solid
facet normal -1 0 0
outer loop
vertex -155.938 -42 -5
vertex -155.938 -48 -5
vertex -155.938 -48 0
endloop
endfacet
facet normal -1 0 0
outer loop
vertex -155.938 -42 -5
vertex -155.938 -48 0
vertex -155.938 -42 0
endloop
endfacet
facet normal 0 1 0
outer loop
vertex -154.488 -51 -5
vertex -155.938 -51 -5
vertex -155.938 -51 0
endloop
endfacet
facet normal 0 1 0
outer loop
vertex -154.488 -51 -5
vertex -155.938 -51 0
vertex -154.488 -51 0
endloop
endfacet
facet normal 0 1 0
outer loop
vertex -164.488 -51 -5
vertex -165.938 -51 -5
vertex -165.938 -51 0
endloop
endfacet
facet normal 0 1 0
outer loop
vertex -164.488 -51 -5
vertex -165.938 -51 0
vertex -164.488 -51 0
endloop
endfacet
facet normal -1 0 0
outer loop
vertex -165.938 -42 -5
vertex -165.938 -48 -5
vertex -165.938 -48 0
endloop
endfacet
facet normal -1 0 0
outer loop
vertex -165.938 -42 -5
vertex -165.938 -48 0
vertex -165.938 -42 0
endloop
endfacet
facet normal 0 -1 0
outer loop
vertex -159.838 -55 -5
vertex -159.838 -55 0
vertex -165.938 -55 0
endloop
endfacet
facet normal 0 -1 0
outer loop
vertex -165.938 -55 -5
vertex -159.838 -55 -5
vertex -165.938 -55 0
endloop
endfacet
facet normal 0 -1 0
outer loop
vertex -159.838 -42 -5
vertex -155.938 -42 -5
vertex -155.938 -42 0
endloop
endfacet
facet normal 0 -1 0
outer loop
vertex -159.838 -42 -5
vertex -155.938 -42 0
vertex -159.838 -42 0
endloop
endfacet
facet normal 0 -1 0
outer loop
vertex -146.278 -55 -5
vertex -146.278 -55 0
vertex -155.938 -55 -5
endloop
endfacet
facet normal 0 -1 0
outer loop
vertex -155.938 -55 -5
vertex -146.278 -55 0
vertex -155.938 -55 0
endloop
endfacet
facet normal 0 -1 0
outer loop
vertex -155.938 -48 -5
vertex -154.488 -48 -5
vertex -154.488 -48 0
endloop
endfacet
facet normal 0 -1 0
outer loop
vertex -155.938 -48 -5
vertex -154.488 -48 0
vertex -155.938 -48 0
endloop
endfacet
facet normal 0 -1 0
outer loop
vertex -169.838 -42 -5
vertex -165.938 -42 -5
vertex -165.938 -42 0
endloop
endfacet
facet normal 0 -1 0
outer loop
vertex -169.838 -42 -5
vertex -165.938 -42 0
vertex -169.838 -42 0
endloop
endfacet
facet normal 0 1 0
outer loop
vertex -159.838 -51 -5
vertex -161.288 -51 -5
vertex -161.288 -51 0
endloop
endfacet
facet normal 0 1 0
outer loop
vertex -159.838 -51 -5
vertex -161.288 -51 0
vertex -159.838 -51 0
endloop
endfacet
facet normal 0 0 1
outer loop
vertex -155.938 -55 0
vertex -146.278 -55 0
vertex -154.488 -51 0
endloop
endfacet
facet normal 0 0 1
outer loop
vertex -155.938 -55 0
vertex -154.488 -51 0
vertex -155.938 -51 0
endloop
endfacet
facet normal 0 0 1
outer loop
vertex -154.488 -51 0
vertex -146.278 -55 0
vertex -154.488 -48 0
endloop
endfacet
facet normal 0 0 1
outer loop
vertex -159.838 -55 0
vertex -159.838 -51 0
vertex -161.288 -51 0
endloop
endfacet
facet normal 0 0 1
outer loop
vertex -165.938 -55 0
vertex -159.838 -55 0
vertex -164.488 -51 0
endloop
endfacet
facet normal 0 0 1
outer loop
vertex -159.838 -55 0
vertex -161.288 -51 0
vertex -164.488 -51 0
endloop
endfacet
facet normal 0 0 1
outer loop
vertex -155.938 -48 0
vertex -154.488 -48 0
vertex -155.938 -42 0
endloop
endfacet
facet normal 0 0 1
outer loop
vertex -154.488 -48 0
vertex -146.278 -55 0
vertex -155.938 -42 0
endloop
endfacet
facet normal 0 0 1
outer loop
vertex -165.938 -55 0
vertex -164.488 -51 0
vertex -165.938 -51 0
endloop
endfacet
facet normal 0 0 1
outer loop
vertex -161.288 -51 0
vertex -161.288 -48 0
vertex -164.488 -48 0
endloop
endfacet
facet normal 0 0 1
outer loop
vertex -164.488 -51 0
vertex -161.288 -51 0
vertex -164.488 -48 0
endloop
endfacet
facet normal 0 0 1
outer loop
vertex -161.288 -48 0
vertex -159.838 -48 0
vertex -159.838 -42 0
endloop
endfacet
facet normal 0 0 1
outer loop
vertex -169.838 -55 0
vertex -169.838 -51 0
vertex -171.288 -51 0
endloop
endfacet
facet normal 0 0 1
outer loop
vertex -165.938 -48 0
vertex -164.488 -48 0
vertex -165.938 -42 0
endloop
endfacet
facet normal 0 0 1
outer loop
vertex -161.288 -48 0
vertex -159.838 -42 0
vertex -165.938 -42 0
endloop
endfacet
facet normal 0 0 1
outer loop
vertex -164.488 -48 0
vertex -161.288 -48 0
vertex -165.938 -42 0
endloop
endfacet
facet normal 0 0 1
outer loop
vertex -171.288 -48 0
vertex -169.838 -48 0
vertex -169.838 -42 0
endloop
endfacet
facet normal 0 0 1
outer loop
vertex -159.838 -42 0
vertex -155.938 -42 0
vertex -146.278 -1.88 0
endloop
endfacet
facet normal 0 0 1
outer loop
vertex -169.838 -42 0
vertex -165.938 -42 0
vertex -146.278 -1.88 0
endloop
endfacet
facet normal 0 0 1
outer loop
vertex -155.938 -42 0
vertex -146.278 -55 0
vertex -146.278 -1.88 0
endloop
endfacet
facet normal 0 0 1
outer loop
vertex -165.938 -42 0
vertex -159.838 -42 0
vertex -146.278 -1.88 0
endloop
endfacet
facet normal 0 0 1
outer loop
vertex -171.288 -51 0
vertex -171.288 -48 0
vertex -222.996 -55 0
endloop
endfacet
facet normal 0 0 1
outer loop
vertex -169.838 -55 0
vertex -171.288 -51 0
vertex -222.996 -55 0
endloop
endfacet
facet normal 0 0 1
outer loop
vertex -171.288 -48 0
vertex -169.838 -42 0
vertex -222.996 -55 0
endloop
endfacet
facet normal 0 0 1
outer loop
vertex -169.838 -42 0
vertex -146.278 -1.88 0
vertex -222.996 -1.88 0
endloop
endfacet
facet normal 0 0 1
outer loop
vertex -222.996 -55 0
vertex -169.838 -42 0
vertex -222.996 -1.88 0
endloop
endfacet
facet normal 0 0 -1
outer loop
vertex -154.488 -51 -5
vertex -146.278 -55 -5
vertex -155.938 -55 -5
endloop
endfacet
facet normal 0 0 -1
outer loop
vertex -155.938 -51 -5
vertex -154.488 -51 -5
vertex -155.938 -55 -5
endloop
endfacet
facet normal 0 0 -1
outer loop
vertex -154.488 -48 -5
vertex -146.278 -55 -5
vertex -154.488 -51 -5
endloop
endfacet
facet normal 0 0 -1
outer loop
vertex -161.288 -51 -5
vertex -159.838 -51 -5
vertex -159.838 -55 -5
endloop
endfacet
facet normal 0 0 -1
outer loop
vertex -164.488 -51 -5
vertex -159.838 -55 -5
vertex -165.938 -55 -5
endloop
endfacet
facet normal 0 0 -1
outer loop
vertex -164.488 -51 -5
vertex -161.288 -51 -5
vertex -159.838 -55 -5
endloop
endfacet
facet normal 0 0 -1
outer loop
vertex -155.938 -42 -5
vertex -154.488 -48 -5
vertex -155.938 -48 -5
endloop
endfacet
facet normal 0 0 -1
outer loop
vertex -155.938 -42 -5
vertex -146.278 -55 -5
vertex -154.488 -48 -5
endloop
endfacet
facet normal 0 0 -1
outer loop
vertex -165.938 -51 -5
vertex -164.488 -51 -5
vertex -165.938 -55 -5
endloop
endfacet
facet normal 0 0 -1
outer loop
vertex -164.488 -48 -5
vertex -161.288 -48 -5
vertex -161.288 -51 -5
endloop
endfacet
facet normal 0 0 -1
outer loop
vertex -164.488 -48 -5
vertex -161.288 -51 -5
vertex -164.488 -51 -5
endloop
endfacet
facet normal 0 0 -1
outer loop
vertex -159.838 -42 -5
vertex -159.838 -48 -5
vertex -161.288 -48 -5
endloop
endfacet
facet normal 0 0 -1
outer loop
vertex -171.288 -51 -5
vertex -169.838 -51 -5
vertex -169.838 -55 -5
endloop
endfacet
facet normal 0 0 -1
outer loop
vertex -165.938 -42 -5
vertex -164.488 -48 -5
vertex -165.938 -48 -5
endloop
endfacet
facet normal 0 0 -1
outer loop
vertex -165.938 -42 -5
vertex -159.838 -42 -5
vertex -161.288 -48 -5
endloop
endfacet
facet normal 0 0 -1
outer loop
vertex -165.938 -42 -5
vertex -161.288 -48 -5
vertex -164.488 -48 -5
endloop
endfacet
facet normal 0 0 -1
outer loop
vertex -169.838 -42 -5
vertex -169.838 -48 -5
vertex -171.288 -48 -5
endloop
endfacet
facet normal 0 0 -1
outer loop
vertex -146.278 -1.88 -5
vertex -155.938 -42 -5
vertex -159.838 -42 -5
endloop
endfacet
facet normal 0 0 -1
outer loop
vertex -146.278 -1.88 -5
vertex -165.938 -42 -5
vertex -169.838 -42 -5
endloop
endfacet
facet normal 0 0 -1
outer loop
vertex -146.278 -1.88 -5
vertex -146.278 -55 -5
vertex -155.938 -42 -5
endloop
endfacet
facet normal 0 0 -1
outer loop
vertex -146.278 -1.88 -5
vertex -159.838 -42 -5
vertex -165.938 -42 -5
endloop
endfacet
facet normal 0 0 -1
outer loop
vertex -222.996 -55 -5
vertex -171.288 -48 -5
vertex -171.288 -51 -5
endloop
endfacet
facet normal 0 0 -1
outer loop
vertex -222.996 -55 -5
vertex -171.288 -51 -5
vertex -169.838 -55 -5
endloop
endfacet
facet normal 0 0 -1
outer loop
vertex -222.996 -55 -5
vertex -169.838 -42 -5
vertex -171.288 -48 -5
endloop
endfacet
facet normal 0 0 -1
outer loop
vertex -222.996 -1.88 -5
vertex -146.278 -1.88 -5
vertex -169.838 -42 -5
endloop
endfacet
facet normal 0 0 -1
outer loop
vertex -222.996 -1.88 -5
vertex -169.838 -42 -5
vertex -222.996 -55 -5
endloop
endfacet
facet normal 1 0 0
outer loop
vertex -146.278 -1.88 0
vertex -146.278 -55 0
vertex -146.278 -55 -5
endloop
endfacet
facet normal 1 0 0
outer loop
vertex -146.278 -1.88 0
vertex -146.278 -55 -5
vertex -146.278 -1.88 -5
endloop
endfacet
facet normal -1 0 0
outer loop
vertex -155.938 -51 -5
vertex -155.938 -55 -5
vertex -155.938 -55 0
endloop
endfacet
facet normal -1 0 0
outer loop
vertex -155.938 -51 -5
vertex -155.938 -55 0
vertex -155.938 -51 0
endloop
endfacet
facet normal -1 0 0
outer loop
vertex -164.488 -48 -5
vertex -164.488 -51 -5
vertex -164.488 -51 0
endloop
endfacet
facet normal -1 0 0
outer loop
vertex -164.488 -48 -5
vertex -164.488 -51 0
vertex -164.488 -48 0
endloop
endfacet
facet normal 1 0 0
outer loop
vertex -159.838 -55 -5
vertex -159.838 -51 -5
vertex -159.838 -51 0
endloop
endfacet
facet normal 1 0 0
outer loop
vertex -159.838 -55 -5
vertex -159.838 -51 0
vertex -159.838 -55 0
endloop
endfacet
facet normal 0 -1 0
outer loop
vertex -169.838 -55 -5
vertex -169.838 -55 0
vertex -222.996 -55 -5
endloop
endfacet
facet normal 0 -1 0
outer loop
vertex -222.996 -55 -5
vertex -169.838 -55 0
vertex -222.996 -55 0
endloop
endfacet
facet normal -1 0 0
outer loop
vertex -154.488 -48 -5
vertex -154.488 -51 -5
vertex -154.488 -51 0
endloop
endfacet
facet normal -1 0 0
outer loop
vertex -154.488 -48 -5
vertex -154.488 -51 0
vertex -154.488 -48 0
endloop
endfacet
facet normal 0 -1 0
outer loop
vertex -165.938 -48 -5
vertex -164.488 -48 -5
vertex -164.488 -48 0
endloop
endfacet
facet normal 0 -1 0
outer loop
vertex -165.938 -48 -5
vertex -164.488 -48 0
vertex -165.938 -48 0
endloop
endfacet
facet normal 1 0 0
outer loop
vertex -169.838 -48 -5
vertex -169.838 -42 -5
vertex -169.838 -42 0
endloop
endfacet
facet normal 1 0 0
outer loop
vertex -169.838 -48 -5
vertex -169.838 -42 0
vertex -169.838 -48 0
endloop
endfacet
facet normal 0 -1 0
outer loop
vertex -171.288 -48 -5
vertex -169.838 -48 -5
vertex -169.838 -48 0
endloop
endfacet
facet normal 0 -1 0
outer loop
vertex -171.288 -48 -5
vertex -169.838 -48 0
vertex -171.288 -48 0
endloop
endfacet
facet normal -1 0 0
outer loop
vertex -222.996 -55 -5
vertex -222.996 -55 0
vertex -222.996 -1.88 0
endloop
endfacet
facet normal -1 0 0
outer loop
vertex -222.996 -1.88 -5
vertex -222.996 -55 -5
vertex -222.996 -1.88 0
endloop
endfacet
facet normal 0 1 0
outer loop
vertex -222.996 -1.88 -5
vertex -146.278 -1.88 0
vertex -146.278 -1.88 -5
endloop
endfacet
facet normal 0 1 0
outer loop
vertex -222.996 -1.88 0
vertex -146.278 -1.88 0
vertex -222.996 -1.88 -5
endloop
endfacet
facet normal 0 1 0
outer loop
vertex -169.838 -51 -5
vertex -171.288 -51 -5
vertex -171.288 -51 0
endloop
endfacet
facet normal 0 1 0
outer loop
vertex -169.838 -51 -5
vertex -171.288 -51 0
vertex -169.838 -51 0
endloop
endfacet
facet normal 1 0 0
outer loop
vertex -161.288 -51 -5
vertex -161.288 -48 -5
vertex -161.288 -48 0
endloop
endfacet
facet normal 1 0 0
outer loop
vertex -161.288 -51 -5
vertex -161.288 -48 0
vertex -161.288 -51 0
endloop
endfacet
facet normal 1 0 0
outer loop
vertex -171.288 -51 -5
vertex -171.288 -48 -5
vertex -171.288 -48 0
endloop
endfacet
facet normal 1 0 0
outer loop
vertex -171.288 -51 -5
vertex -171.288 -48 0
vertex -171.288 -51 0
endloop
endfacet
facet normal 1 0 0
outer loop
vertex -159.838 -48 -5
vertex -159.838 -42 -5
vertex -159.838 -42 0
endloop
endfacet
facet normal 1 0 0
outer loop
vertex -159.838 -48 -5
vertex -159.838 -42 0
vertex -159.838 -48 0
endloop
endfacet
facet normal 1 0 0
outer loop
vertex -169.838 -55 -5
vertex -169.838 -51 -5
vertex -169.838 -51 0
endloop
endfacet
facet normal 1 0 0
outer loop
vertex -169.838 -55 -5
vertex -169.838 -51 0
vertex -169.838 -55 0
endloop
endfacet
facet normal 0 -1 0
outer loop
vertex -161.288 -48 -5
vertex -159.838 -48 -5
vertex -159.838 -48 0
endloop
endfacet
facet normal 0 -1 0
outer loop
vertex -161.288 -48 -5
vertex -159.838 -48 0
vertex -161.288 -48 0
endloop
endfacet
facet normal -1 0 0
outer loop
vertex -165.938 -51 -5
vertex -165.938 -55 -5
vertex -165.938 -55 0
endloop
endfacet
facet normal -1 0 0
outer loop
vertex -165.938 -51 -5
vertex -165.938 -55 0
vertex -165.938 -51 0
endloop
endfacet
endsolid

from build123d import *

# Parameters (mm, degrees)
SKETCH2_W           = 76.718161642
SKETCH2_H           = 53.12
BOSS_EXTRUDE1_DEPTH = 5
CUT_EXTRUDE1_DEPTH  = 10


with BuildPart() as part:
    # Sketch2 → Boss-Extrude1 (new body)
    with BuildSketch(Plane(origin=(0, 0, 0), x_dir=(-1, 0, 0), z_dir=(0, 0, -1))):
        with Locations((184.636580821, -28.44)):
            Rectangle(SKETCH2_W, SKETCH2_H)
    extrude(amount=BOSS_EXTRUDE1_DEPTH)

    # Sketch3 → Cut-Extrude1 (cut)
    with BuildSketch(Plane(origin=(0, 0, -5), x_dir=(-1, 0, 0), z_dir=(0, 0, -1))):
        Polygon((155.9375, -55), (155.9375, -51), (154.4875, -51), (154.4875, -48), (155.9375, -48), (155.9375, -42), (159.8375, -42), (159.8375, -48), (161.2875, -48), (161.2875, -51), (159.8375, -51), (159.8375, -55), align=None)
        Polygon((165.9375, -55), (165.9375, -51), (164.4875, -51), (164.4875, -48), (165.9375, -48), (165.9375, -42), (169.8375, -42), (169.8375, -48), (171.2875, -48), (171.2875, -51), (169.8375, -51), (169.8375, -55), align=None)
    extrude(amount=-CUT_EXTRUDE1_DEPTH, mode=Mode.SUBTRACT)


solid = part.part
